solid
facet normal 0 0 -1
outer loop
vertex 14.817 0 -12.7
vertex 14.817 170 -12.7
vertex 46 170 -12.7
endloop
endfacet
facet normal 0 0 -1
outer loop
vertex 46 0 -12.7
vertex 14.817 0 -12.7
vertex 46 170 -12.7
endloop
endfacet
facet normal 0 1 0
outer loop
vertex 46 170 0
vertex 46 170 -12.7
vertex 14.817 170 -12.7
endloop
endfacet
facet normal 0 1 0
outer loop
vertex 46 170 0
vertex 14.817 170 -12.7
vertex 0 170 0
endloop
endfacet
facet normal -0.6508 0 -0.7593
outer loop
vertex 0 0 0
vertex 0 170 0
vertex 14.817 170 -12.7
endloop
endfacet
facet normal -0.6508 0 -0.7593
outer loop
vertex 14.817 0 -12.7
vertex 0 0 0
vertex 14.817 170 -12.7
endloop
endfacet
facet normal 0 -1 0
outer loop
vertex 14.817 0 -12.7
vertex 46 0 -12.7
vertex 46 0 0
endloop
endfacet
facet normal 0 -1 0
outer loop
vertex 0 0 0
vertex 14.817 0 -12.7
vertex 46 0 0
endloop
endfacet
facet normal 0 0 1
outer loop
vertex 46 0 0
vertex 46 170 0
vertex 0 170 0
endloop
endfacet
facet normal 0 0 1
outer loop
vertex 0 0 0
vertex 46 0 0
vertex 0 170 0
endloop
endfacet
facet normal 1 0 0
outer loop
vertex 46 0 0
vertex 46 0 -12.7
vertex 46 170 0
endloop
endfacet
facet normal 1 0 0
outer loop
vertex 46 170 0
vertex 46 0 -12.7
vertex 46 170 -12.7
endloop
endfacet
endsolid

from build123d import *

# Parameters (mm, degrees)
SALIENTE_EXTRUIR1_DEPTH    = 170
CROQUIS2_W                 = 8
CROQUIS2_H                 = 27
CORTAR_EXTRUIR1_DEPTH      = 1
CORTAR_EXTRUIR1_DEPTH_BACK = 16
CROQUIS3_W                 = 38.06511858
CROQUIS3_H                 = 175.826127046
CORTAR_EXTRUIR2_DEPTH      = 1
CORTAR_EXTRUIR2_DEPTH_BACK = 16
CROQUIS4_W                 = 35.532251822
CROQUIS4_H                 = 7.536766594
CORTAR_EXTRUIR3_DEPTH      = 1
CORTAR_EXTRUIR3_DEPTH_BACK = 171


with BuildPart() as part:
    # Croquis1 → Saliente-Extruir1 (new body)
    with BuildSketch(Plane(origin=(0, 0, 0), x_dir=(1, 0, 0), z_dir=(0, 1, 0))):
        Polygon((0, 0), (17.50080029, 15), (60, 15), (60, 0), align=None)
    extrude(amount=SALIENTE_EXTRUIR1_DEPTH)

    # Croquis2 → Cortar-Extruir1 (cut, two sides)
    with BuildSketch(Plane(origin=(0, 0, -15), x_dir=(-1, 0, 0), z_dir=(0, 0, -1))) as cortar_extruir1_sk:
        with Locations((-56, 13.5)):
            Rectangle(CROQUIS2_W, CROQUIS2_H)
        with Locations((-56, 156.5)):
            Rectangle(CROQUIS2_W, CROQUIS2_H)
    extrude(amount=CORTAR_EXTRUIR1_DEPTH, mode=Mode.SUBTRACT)
    extrude(cortar_extruir1_sk.sketch, amount=-CORTAR_EXTRUIR1_DEPTH_BACK, mode=Mode.SUBTRACT)

    # Croquis3 → Cortar-Extruir2 (cut, two sides)
    with BuildSketch(Plane(origin=(0, 0, -15), x_dir=(-1, 0, 0), z_dir=(0, 0, -1))) as cortar_extruir2_sk:
        with Locations((-65.03255929, 82.086936477)):
            Rectangle(CROQUIS3_W, CROQUIS3_H)
    extrude(amount=CORTAR_EXTRUIR2_DEPTH, mode=Mode.SUBTRACT)
    extrude(cortar_extruir2_sk.sketch, amount=-CORTAR_EXTRUIR2_DEPTH_BACK, mode=Mode.SUBTRACT)

    # Croquis4 → Cortar-Extruir3 (cut, two sides)
    with BuildSketch(Plane.XZ) as cortar_extruir3_sk:
        with Locations((28.233874089, -16.468383297)):
            Rectangle(CROQUIS4_W, CROQUIS4_H)
    extrude(amount=CORTAR_EXTRUIR3_DEPTH, mode=Mode.SUBTRACT)
    extrude(cortar_extruir3_sk.sketch, amount=-CORTAR_EXTRUIR3_DEPTH_BACK, mode=Mode.SUBTRACT)


solid = part.part
